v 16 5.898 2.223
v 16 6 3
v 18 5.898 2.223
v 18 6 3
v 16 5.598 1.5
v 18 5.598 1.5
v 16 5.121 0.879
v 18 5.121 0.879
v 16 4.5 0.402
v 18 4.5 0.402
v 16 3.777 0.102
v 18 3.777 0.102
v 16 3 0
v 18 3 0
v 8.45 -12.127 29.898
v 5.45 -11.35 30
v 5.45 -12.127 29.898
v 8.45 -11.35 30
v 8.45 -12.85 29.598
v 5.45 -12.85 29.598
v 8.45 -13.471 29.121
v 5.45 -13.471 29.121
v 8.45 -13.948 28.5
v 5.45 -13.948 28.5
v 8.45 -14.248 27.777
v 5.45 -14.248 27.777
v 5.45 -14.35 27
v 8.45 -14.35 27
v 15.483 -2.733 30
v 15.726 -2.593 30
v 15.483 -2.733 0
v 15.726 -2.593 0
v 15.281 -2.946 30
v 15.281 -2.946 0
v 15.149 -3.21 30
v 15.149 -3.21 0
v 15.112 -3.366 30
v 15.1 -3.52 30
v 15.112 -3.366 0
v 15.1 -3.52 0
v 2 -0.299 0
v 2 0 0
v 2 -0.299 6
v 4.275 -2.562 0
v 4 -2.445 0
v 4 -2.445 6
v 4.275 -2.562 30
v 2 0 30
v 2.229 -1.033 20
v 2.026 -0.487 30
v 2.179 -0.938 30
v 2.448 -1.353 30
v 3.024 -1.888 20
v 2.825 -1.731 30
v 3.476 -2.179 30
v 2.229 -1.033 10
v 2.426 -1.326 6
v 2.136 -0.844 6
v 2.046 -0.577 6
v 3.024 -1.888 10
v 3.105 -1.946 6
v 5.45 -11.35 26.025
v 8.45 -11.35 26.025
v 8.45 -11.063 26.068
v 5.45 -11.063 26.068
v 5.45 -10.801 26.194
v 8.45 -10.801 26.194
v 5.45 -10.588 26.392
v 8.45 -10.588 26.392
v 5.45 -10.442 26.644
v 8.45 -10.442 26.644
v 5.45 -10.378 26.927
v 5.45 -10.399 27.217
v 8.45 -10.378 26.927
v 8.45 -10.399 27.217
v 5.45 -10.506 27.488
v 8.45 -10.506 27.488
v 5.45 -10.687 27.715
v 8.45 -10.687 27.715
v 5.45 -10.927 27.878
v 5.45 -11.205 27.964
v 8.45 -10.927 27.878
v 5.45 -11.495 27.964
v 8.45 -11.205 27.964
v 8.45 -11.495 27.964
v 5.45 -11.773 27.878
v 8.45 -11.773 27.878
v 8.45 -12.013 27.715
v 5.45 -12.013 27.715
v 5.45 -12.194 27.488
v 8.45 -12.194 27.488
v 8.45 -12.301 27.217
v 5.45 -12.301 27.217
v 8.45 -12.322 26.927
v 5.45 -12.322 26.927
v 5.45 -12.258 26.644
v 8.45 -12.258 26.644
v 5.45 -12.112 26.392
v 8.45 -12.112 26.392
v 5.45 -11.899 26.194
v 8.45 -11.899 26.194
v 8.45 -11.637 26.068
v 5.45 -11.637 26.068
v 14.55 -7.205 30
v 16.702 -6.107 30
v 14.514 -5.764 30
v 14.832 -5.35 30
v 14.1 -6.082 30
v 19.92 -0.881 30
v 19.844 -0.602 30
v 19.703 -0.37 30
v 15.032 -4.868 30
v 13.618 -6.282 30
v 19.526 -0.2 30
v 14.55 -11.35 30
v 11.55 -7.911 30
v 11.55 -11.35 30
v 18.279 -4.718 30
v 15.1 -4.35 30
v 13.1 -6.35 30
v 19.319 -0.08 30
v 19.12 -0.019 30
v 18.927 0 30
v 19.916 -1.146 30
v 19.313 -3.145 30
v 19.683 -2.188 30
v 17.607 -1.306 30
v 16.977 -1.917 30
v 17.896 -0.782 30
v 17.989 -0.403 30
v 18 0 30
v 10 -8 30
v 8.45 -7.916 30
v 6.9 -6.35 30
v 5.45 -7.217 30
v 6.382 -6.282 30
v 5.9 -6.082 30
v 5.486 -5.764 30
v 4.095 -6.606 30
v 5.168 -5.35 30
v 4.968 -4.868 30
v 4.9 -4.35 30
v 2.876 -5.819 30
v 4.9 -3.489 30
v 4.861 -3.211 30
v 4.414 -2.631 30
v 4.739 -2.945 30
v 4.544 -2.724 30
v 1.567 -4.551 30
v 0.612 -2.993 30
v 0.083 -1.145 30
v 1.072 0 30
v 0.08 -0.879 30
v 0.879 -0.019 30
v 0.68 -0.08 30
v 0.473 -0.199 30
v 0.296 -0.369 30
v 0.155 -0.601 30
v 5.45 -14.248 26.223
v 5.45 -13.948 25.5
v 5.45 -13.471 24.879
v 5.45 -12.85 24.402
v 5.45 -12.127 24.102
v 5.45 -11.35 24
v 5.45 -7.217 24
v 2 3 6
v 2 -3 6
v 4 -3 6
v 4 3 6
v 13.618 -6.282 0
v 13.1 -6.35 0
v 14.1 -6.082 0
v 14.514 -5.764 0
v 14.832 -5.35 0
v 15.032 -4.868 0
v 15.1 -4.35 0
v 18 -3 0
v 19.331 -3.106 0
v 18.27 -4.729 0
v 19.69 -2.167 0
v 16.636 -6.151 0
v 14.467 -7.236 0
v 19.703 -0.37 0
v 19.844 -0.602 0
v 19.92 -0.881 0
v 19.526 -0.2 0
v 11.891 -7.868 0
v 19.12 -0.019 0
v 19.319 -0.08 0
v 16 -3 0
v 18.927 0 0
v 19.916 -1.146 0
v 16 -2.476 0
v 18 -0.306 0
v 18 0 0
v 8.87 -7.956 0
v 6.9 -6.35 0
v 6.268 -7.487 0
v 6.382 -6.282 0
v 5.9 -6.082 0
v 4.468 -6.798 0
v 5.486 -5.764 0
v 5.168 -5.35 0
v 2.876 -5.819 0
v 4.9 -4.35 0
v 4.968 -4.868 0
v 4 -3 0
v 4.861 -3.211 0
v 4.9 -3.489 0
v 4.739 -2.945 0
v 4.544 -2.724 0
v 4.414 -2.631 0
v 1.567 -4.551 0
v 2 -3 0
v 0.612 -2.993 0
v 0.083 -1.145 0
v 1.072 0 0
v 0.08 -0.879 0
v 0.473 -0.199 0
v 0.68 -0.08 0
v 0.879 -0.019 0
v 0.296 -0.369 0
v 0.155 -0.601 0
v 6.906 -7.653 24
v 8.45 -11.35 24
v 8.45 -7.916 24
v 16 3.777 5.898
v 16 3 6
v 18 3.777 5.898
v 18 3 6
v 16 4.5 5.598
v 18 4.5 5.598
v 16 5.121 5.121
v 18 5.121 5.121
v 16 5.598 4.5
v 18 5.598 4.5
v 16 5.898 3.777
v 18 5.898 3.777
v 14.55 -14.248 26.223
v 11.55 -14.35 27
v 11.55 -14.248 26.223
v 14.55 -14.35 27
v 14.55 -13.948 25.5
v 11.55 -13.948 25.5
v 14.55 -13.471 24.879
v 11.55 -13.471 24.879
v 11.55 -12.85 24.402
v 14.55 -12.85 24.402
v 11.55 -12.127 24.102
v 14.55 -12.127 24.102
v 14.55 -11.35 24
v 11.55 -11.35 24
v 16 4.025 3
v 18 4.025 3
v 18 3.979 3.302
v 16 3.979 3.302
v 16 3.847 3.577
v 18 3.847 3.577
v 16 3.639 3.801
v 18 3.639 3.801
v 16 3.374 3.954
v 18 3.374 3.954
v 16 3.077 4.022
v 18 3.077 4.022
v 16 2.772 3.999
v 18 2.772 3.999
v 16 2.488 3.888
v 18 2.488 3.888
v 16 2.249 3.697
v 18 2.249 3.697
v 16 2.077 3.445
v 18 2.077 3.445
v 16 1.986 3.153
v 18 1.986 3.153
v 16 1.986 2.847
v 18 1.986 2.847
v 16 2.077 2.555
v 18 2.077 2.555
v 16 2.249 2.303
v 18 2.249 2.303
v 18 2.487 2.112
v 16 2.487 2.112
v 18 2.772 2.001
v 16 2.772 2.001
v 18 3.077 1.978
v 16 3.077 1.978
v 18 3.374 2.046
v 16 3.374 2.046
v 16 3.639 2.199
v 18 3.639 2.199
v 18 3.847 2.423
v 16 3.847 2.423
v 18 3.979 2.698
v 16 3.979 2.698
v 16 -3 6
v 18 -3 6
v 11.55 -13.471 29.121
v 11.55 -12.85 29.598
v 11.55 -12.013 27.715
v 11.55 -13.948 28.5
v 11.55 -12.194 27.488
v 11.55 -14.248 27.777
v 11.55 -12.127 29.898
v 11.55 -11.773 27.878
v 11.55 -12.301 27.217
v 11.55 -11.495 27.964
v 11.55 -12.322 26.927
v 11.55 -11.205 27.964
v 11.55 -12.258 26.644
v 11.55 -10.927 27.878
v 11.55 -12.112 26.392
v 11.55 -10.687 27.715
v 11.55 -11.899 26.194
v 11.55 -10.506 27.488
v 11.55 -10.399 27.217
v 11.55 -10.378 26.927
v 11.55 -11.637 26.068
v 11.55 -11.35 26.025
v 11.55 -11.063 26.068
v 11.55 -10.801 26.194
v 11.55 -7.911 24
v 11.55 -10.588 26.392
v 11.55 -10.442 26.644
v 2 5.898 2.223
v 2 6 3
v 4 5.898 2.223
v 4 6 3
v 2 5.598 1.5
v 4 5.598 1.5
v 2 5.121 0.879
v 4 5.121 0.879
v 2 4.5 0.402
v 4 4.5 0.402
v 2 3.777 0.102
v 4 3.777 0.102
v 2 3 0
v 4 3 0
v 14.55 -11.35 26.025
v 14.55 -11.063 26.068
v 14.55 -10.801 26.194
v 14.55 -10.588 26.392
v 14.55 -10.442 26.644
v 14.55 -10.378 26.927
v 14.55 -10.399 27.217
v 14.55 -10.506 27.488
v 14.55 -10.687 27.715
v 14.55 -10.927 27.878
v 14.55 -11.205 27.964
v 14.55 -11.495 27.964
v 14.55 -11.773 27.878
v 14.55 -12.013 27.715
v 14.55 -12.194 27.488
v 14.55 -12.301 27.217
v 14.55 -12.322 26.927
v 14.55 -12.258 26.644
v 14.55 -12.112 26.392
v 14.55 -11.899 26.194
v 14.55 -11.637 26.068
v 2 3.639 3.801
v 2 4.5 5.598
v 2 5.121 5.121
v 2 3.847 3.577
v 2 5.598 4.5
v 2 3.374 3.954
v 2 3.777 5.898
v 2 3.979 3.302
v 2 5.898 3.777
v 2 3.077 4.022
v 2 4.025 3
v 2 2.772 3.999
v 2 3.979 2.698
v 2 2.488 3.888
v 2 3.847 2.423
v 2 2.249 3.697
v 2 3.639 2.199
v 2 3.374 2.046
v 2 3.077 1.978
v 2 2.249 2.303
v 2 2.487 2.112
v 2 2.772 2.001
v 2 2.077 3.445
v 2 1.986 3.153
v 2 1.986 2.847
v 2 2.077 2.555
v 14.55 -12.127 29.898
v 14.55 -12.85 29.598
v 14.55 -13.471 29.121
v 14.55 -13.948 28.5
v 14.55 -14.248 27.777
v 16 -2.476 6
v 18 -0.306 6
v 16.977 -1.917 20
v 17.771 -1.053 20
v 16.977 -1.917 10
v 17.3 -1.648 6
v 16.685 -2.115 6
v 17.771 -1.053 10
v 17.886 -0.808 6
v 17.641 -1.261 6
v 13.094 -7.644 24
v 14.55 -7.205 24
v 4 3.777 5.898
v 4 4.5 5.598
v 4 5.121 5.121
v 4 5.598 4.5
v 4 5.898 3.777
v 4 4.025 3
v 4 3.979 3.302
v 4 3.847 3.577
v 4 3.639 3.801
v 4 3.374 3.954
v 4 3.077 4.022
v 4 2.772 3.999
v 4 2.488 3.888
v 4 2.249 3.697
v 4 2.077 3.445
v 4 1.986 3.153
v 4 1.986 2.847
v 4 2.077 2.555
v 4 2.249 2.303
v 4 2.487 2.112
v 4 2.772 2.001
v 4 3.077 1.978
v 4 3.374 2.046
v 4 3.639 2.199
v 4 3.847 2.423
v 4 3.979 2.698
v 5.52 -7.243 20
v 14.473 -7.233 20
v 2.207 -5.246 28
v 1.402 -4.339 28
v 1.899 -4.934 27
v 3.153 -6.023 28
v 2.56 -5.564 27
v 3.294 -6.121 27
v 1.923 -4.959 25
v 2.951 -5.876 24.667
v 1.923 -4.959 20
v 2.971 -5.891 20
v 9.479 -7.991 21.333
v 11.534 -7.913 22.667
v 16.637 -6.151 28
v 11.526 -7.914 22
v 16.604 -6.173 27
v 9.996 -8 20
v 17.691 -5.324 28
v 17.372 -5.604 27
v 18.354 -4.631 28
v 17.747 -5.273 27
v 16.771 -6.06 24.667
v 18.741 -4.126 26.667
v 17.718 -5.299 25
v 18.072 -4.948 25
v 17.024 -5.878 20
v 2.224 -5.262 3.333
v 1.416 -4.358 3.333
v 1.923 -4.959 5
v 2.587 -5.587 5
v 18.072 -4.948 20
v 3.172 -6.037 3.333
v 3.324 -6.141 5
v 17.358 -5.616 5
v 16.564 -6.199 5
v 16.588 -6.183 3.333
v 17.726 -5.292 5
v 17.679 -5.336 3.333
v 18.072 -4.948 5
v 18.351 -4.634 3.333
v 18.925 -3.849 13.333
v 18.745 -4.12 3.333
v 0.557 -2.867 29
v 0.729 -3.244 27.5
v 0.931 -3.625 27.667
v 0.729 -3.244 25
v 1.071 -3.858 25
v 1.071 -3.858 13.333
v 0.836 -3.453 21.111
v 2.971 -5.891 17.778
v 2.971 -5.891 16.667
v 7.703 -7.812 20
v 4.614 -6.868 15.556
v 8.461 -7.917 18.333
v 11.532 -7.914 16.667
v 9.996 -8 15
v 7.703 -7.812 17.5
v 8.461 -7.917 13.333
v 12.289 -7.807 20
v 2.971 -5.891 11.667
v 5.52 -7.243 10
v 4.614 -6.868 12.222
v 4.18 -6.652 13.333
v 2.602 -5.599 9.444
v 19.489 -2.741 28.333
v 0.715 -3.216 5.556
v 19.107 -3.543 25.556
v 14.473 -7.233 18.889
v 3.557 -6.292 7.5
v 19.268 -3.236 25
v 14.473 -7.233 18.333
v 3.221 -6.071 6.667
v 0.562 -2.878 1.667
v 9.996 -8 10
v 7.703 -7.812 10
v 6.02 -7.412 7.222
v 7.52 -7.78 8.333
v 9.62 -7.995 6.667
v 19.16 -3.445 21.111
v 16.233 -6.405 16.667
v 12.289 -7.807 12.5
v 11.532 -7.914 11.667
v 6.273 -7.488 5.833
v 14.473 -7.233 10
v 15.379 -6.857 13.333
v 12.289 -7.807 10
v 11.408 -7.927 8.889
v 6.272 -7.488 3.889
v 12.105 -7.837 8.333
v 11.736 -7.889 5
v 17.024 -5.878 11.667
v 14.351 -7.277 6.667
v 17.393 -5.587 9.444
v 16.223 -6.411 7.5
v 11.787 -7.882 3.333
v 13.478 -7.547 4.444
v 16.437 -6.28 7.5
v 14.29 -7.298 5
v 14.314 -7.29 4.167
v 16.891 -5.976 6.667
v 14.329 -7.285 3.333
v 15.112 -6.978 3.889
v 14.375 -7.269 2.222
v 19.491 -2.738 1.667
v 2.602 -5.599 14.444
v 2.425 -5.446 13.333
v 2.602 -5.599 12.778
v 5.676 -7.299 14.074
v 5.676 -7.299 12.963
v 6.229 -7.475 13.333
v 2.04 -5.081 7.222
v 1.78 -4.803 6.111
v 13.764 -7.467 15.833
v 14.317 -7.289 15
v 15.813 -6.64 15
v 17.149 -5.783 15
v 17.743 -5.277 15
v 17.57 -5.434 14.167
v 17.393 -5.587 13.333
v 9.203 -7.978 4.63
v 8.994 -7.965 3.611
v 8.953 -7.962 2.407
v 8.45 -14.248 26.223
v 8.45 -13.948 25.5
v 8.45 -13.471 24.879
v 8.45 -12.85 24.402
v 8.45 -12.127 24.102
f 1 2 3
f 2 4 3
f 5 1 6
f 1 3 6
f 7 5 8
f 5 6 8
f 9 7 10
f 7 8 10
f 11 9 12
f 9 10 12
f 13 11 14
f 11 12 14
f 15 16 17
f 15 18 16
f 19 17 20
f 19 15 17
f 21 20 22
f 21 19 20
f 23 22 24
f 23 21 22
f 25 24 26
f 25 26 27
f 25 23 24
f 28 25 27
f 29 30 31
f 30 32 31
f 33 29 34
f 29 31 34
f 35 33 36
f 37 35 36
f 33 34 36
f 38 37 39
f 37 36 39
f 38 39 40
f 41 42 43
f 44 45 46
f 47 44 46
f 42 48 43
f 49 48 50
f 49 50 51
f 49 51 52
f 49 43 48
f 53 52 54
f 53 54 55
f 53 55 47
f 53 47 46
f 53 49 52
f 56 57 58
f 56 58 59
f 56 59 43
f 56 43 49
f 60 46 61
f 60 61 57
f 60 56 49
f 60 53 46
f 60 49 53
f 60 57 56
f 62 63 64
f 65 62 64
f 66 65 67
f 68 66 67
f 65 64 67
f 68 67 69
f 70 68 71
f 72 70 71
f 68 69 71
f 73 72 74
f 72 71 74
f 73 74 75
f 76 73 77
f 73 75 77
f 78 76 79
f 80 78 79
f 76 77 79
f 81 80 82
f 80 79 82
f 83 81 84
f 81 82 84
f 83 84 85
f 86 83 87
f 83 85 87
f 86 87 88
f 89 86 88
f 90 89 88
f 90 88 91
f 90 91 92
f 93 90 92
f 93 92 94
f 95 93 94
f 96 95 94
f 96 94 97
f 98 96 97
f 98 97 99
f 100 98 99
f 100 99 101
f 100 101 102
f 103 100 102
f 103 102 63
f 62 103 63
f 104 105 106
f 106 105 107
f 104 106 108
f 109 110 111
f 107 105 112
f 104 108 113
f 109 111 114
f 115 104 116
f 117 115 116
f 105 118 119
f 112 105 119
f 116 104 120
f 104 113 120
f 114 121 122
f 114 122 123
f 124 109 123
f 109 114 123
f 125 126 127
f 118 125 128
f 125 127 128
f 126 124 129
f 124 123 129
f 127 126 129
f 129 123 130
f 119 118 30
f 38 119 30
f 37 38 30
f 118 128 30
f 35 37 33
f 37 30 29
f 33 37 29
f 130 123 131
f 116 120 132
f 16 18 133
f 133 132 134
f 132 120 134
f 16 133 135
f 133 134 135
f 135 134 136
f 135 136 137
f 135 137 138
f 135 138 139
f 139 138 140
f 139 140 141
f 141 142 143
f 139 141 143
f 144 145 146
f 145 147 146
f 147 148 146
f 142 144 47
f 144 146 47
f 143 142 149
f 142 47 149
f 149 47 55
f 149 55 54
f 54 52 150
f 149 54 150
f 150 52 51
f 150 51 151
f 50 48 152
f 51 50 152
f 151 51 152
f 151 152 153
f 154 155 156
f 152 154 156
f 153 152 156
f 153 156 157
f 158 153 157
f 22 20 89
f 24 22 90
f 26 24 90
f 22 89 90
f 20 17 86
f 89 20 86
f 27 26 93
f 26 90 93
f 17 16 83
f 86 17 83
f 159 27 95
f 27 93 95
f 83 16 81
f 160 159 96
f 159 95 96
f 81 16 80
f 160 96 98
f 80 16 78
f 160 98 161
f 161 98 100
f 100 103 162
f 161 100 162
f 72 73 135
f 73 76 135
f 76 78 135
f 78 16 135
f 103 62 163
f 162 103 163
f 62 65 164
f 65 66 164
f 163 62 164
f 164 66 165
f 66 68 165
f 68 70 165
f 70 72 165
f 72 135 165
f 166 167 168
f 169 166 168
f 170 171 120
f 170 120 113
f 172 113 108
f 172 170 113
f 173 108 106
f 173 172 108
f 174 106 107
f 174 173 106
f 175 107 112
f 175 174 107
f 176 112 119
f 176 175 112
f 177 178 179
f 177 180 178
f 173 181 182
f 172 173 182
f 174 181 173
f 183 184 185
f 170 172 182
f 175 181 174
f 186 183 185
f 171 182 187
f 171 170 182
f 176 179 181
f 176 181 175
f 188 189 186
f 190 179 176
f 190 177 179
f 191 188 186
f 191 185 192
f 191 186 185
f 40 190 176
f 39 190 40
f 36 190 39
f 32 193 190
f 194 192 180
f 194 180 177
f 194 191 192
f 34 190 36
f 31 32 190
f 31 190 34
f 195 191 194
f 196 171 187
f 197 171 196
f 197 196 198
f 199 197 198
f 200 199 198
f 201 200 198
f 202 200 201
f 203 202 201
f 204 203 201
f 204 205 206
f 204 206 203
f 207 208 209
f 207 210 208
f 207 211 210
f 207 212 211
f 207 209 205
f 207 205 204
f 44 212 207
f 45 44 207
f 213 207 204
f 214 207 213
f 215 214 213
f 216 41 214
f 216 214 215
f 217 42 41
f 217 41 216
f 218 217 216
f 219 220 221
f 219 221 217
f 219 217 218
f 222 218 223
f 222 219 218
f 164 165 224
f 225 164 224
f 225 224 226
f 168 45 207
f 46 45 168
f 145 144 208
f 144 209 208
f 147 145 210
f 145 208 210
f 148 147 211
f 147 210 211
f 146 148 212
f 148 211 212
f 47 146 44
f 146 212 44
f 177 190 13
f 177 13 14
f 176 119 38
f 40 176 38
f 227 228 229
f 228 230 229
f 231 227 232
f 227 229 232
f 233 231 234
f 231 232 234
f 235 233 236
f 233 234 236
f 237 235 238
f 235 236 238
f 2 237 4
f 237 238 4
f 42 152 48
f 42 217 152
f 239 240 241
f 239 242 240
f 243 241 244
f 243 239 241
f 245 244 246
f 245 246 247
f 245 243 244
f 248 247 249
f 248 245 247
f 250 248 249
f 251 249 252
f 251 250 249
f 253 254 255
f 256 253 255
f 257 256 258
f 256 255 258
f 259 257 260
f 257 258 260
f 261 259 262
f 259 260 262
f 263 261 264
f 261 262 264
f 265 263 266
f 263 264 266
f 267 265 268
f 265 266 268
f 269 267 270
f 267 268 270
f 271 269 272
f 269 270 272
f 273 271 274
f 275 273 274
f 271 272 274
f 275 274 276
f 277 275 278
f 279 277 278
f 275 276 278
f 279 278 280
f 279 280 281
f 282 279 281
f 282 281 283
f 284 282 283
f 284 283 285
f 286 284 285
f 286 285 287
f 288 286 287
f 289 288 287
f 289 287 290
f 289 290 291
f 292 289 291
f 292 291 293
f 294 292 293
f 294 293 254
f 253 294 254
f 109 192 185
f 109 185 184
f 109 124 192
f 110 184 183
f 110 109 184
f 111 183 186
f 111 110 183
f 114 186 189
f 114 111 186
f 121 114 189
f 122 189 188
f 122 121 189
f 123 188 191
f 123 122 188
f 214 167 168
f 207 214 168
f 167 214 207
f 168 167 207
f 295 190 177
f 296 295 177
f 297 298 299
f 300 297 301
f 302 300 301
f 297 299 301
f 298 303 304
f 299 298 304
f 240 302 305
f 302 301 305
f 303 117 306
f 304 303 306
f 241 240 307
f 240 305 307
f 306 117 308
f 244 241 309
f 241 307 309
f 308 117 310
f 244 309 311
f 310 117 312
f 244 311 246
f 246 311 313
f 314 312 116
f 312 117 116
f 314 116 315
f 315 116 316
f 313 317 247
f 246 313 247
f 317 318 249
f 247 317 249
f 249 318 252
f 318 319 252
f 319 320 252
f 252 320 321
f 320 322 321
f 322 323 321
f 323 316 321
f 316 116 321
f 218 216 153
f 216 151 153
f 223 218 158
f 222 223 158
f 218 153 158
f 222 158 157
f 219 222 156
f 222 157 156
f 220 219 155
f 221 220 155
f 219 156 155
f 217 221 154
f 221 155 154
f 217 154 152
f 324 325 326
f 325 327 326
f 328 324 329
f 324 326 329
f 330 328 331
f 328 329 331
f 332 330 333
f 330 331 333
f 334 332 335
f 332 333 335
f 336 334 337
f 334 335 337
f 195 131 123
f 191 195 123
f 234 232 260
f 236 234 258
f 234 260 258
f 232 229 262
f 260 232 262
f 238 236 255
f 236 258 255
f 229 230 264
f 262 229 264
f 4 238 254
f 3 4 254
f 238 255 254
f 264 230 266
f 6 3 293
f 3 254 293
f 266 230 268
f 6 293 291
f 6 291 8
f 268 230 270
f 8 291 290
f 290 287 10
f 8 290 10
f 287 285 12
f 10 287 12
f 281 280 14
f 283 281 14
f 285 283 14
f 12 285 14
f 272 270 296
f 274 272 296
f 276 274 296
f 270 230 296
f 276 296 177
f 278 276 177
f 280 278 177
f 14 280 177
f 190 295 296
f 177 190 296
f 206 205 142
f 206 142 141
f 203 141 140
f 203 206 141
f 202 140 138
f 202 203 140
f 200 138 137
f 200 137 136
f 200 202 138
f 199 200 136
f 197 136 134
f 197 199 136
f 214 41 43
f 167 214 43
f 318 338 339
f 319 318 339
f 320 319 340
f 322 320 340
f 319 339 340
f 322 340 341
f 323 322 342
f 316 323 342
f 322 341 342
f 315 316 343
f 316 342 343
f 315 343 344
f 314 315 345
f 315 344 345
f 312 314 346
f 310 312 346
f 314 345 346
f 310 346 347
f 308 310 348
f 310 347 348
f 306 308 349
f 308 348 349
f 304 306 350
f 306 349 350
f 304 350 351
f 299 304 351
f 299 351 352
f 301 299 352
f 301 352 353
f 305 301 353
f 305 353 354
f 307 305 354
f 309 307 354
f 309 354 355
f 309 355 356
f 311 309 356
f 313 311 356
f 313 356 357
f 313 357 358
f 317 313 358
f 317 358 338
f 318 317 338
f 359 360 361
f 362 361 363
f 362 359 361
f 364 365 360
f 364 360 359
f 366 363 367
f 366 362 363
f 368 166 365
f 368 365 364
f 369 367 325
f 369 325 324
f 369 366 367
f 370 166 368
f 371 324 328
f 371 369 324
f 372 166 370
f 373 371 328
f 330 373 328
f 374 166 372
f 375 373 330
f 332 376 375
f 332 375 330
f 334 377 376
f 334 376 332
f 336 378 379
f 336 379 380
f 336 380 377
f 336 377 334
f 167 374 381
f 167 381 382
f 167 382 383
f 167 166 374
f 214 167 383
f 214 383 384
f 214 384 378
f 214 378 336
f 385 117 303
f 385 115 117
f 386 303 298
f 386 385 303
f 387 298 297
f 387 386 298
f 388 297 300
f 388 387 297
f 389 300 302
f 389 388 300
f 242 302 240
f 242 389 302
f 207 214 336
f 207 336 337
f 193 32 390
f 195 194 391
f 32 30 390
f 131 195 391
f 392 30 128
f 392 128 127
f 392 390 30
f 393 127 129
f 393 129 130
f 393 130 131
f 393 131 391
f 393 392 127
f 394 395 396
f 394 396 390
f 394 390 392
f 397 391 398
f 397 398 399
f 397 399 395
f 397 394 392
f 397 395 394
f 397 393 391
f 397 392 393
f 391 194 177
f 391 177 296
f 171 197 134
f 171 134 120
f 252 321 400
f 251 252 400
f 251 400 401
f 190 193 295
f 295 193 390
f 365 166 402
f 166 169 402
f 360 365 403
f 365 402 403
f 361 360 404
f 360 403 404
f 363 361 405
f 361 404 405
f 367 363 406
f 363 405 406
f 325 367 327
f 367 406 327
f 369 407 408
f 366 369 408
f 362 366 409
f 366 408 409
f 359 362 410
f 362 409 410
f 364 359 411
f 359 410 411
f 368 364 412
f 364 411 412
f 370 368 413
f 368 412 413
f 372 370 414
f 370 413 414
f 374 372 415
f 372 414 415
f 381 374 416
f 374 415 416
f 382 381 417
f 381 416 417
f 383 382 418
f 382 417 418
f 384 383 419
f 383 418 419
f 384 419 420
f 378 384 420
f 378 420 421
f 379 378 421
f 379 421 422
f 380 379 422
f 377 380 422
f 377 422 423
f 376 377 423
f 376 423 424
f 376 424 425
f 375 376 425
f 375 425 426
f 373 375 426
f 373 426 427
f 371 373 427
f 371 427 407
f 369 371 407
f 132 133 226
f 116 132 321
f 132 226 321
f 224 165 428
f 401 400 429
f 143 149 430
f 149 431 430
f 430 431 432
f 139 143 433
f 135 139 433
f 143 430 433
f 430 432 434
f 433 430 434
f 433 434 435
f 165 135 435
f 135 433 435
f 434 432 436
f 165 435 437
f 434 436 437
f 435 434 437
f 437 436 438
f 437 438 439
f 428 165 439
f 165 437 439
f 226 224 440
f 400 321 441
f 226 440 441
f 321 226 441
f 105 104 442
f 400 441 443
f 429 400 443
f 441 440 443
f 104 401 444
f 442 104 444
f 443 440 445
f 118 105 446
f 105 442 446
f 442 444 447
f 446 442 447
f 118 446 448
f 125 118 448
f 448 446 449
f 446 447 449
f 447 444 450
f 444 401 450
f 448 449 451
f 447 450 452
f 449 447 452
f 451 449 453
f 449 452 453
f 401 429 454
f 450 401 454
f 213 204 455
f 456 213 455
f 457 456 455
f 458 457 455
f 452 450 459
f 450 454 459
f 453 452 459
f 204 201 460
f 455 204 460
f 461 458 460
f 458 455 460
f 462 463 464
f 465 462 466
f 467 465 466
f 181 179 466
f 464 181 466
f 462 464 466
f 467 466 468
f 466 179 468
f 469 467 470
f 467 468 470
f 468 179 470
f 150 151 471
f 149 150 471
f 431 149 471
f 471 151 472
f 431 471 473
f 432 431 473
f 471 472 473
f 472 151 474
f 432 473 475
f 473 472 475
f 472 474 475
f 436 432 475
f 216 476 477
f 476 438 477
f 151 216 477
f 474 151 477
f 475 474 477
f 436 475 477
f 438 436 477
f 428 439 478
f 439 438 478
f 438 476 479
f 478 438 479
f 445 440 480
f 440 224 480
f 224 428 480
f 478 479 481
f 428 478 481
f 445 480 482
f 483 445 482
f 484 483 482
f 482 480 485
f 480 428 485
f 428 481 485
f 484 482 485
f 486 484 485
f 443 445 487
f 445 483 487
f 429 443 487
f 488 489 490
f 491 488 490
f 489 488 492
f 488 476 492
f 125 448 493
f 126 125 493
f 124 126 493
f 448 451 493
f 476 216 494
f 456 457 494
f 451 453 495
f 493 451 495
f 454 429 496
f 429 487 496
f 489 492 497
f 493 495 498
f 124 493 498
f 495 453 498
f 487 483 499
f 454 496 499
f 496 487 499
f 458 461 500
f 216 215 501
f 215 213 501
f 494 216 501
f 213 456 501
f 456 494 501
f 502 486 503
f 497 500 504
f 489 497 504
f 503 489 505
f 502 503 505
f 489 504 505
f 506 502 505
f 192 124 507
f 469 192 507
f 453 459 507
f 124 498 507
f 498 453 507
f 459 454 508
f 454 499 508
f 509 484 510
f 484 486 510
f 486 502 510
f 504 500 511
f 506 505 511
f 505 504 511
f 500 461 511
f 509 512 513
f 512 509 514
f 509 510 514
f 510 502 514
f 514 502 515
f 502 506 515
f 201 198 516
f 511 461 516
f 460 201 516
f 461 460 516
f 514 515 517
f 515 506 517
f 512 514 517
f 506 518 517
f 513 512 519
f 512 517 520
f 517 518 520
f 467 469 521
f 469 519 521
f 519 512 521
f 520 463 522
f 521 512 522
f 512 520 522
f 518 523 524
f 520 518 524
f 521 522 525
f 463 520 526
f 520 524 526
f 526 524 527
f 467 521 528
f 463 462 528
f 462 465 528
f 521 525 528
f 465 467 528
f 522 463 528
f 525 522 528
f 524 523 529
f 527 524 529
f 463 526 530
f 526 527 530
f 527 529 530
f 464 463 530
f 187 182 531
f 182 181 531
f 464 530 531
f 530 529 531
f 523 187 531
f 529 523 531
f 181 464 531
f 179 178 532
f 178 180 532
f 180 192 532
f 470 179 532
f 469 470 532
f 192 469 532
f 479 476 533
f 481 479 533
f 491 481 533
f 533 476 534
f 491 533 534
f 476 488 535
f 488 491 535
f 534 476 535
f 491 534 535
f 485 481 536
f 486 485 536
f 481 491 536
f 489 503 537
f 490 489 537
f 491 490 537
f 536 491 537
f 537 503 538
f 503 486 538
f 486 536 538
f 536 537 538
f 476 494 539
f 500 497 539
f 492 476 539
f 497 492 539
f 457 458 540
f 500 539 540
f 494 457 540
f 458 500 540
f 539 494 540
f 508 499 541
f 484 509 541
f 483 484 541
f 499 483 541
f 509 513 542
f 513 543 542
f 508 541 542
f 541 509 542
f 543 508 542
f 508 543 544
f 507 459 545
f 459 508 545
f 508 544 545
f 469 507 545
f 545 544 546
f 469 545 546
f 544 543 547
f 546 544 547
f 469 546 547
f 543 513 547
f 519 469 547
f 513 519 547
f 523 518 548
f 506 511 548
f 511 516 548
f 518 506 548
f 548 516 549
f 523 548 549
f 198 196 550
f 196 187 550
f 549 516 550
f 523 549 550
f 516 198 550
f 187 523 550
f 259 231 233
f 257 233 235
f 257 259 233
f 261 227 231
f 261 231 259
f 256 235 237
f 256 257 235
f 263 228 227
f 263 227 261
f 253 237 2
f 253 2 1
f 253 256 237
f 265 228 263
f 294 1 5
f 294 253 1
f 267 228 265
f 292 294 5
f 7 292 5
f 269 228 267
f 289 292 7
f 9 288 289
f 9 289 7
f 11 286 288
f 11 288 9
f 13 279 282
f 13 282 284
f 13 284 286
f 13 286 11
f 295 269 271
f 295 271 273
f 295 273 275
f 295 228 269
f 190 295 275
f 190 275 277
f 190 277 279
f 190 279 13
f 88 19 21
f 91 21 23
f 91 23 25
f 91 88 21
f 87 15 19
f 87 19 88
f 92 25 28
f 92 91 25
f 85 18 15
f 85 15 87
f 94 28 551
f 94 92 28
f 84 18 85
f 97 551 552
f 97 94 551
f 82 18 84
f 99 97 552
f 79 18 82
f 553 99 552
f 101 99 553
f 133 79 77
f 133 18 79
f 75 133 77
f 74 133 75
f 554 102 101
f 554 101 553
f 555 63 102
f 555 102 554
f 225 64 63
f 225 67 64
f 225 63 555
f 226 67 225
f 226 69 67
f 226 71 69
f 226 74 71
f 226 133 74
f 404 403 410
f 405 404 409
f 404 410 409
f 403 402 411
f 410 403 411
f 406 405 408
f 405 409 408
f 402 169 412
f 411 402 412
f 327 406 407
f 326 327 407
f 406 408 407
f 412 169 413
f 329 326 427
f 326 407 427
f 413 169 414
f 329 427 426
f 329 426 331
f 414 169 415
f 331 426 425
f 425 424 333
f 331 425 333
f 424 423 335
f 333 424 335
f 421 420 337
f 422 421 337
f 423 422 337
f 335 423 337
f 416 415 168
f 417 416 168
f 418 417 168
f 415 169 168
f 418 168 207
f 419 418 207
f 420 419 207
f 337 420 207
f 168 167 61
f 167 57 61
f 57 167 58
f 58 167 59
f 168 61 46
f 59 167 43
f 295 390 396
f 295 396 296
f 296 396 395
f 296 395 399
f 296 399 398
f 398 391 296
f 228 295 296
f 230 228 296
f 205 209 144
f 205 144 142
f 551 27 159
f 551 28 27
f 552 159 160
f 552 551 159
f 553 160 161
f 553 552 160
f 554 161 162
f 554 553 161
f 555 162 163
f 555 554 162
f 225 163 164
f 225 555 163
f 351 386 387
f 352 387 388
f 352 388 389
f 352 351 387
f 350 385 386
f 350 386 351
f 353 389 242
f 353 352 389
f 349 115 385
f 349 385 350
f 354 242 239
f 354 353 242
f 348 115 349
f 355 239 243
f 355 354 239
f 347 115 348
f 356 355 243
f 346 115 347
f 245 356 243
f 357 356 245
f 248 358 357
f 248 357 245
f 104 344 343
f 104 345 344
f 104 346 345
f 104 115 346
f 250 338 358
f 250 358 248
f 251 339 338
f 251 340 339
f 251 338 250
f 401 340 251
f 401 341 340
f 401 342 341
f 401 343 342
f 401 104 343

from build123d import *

# Parameters (mm, degrees)
BOSS_EXTRUDE1_DEPTH   = 30
CUT_EXTRUDE2_DEPTH    = 30
SKETCH3_W             = 2
SKETCH3_H             = 6
BOSS_EXTRUDE2_DEPTH   = 6
BOSS_EXTRUDE2_2_DEPTH = 6
SKETCH8_W             = 2
SKETCH8_H             = 6
CUT_EXTRUDE5_DEPTH    = 3
SKETCH9_W             = 2
SKETCH9_H             = 6
BOSS_EXTRUDE5_DEPTH   = 3
SKETCH5_R             = 1.025
CUT_EXTRUDE6_DEPTH    = 22
SKETCH10_W            = 3
SKETCH10_H            = 6
BOSS_EXTRUDE6_DEPTH   = 8
SKETCH11_R            = 0.975
CUT_EXTRUDE7_DEPTH    = 14
FILLET1_R             = 3
FILLET2_R             = 3
FILLET3_R             = 3
FILLET4_R             = 1


with BuildPart() as part:
    # Sketch1 → Boss-Extrude1 (new body)
    with BuildSketch(Plane.XY):
        with BuildLine():
            Line((0, 0), (2, 0))
            add(Edge.make_bspline(
                [(2, 0), (1.626861105, -4.612179168), (18.373138895, -4.721154165), (18, 0)],
                knots=[0, 0, 0, 0, 1, 1, 1, 1], degree=3))
            Line((18, 0), (20, 0))
            add(Edge.make_bspline(
                [(0, 0), (0.02488992, -10.695993841), (19.97511008, -10.637339492), (20, 0)],
                knots=[0, 0, 0, 0, 1, 1, 1, 1], degree=3))
        make_face()
    extrude(amount=BOSS_EXTRUDE1_DEPTH)

    # Sketch2 → Cut-Extrude2 (cut)
    with BuildSketch(Plane(origin=(0, 0, 0), x_dir=(-1, 0, 0), z_dir=(0, 0, -1))):
        with BuildLine():
            Line((-15.1, -2.75), (-4.9, -2.75))
            Line((-4.9, -2.75), (-4.9, -4.35))
            ThreePointArc((-4.9, -4.35), (-5.485786438, -5.764213562), (-6.9, -6.35))
            Line((-6.9, -6.35), (-13.1, -6.35))
            ThreePointArc((-13.1, -6.35), (-14.514213562, -5.764213562), (-15.1, -4.35))
            Line((-15.1, -4.35), (-15.1, -2.75))
        make_face()
    extrude(amount=-CUT_EXTRUDE2_DEPTH, mode=Mode.SUBTRACT)

    # Sketch8 → Cut-Extrude5 (cut)
    with BuildSketch(Plane.XZ):
        with Locations((3, 3)):
            Rectangle(SKETCH8_W, SKETCH8_H)
        with Locations((17, 3)):
            Rectangle(SKETCH8_W, SKETCH8_H)
    extrude(amount=CUT_EXTRUDE5_DEPTH, mode=Mode.SUBTRACT)

    # Sketch10 → Boss-Extrude6 (add)
    with BuildSketch(Plane(origin=(0, -6.35, 0), x_dir=(1, 0, 0), z_dir=(0, 1, 0))):
        with Locations((13.05, -27)):
            Rectangle(SKETCH10_W, SKETCH10_H)
        with Locations((6.95, -27)):
            Rectangle(SKETCH10_W, SKETCH10_H)
    extrude(amount=-BOSS_EXTRUDE6_DEPTH)

    # Sketch11 → Cut-Extrude7 (cut)
    with BuildSketch(Plane(origin=(14.55, 0, 0), x_dir=(0, 0, -1), z_dir=(1, 0, 0))):
        with Locations((-27, -11.35)):
            Circle(SKETCH11_R)
    extrude(amount=-CUT_EXTRUDE7_DEPTH, mode=Mode.SUBTRACT)

    # Fillet3
    fillet3_edges = [part.edges().sort_by_distance(p)[0] for p in [
        (13.05, -14.35, 30),
        (13.05, -14.35, 24),
        (6.95, -14.35, 24),
        (6.95, -14.35, 30),
    ]]
    fillet(fillet3_edges, radius=FILLET3_R - 0.0001)  # a hair under: the kernel refuses the full size

    # Fillet4
    fillet4_edges = [part.edges().sort_by_distance(p)[0] for p in [
        (20, 0, 15),
        (0, 0, 15),
        (15.1, -2.817474899, 15),
        (4.9, -2.788263927, 15),
    ]]
    fillet(fillet4_edges, radius=FILLET4_R)


with BuildPart() as body_2:
    # Sketch3 → Boss-Extrude2 (new body)
    with BuildSketch(Plane(origin=(0, 0, 0), x_dir=(1, 0, 0), z_dir=(0, 1, 0))):
        with Locations((3, -3)):
            Rectangle(SKETCH3_W, SKETCH3_H)
    extrude(amount=BOSS_EXTRUDE2_DEPTH)



with BuildPart() as body_3:
    # Sketch3 → Boss-Extrude2 2 (new body)
    with BuildSketch(Plane(origin=(0, 0, 0), x_dir=(1, 0, 0), z_dir=(0, 1, 0))):
        with Locations((17, -3)):
            Rectangle(SKETCH3_W, SKETCH3_H)
    extrude(amount=BOSS_EXTRUDE2_2_DEPTH)


with BuildPart() as body_2_1:
    add(body_2.part)

    add(body_3.part)  # Boss-Extrude5 merges body 3
    # Sketch9 → Boss-Extrude5 (add)
    with BuildSketch(Plane(origin=(0, -3, 0), x_dir=(1, 0, 0), z_dir=(0, 1, 0))):
        with Locations((3, -3)):
            Rectangle(SKETCH9_W, SKETCH9_H)
        with Locations((17, -3)):
            Rectangle(SKETCH9_W, SKETCH9_H)
    extrude(amount=BOSS_EXTRUDE5_DEPTH)

    # Sketch5 → Cut-Extrude6 (cut)
    with BuildSketch(Plane(origin=(20, 0, 0), x_dir=(0, 0, -1), z_dir=(1, 0, 0))):
        with Locations(Location((-3, 3, 0), (0, 0, 90))):
            Circle(SKETCH5_R)
    extrude(amount=-CUT_EXTRUDE6_DEPTH, mode=Mode.SUBTRACT)

    # Fillet1
    fillet1_edges = [body_2_1.edges().sort_by_distance(p)[0] for p in [
        (17, 6, 6),
        (17, 6, 0),
    ]]
    fillet(fillet1_edges, radius=FILLET1_R - 0.0001)  # a hair under: the kernel refuses the full size

    # Fillet2
    fillet2_edges = [body_2_1.edges().sort_by_distance(p)[0] for p in [
        (3, 6, 0),
        (3, 6, 6),
    ]]
    fillet(fillet2_edges, radius=FILLET2_R - 0.0001)  # a hair under: the kernel refuses the full size


solid = Compound([part.part, body_2_1.part])
